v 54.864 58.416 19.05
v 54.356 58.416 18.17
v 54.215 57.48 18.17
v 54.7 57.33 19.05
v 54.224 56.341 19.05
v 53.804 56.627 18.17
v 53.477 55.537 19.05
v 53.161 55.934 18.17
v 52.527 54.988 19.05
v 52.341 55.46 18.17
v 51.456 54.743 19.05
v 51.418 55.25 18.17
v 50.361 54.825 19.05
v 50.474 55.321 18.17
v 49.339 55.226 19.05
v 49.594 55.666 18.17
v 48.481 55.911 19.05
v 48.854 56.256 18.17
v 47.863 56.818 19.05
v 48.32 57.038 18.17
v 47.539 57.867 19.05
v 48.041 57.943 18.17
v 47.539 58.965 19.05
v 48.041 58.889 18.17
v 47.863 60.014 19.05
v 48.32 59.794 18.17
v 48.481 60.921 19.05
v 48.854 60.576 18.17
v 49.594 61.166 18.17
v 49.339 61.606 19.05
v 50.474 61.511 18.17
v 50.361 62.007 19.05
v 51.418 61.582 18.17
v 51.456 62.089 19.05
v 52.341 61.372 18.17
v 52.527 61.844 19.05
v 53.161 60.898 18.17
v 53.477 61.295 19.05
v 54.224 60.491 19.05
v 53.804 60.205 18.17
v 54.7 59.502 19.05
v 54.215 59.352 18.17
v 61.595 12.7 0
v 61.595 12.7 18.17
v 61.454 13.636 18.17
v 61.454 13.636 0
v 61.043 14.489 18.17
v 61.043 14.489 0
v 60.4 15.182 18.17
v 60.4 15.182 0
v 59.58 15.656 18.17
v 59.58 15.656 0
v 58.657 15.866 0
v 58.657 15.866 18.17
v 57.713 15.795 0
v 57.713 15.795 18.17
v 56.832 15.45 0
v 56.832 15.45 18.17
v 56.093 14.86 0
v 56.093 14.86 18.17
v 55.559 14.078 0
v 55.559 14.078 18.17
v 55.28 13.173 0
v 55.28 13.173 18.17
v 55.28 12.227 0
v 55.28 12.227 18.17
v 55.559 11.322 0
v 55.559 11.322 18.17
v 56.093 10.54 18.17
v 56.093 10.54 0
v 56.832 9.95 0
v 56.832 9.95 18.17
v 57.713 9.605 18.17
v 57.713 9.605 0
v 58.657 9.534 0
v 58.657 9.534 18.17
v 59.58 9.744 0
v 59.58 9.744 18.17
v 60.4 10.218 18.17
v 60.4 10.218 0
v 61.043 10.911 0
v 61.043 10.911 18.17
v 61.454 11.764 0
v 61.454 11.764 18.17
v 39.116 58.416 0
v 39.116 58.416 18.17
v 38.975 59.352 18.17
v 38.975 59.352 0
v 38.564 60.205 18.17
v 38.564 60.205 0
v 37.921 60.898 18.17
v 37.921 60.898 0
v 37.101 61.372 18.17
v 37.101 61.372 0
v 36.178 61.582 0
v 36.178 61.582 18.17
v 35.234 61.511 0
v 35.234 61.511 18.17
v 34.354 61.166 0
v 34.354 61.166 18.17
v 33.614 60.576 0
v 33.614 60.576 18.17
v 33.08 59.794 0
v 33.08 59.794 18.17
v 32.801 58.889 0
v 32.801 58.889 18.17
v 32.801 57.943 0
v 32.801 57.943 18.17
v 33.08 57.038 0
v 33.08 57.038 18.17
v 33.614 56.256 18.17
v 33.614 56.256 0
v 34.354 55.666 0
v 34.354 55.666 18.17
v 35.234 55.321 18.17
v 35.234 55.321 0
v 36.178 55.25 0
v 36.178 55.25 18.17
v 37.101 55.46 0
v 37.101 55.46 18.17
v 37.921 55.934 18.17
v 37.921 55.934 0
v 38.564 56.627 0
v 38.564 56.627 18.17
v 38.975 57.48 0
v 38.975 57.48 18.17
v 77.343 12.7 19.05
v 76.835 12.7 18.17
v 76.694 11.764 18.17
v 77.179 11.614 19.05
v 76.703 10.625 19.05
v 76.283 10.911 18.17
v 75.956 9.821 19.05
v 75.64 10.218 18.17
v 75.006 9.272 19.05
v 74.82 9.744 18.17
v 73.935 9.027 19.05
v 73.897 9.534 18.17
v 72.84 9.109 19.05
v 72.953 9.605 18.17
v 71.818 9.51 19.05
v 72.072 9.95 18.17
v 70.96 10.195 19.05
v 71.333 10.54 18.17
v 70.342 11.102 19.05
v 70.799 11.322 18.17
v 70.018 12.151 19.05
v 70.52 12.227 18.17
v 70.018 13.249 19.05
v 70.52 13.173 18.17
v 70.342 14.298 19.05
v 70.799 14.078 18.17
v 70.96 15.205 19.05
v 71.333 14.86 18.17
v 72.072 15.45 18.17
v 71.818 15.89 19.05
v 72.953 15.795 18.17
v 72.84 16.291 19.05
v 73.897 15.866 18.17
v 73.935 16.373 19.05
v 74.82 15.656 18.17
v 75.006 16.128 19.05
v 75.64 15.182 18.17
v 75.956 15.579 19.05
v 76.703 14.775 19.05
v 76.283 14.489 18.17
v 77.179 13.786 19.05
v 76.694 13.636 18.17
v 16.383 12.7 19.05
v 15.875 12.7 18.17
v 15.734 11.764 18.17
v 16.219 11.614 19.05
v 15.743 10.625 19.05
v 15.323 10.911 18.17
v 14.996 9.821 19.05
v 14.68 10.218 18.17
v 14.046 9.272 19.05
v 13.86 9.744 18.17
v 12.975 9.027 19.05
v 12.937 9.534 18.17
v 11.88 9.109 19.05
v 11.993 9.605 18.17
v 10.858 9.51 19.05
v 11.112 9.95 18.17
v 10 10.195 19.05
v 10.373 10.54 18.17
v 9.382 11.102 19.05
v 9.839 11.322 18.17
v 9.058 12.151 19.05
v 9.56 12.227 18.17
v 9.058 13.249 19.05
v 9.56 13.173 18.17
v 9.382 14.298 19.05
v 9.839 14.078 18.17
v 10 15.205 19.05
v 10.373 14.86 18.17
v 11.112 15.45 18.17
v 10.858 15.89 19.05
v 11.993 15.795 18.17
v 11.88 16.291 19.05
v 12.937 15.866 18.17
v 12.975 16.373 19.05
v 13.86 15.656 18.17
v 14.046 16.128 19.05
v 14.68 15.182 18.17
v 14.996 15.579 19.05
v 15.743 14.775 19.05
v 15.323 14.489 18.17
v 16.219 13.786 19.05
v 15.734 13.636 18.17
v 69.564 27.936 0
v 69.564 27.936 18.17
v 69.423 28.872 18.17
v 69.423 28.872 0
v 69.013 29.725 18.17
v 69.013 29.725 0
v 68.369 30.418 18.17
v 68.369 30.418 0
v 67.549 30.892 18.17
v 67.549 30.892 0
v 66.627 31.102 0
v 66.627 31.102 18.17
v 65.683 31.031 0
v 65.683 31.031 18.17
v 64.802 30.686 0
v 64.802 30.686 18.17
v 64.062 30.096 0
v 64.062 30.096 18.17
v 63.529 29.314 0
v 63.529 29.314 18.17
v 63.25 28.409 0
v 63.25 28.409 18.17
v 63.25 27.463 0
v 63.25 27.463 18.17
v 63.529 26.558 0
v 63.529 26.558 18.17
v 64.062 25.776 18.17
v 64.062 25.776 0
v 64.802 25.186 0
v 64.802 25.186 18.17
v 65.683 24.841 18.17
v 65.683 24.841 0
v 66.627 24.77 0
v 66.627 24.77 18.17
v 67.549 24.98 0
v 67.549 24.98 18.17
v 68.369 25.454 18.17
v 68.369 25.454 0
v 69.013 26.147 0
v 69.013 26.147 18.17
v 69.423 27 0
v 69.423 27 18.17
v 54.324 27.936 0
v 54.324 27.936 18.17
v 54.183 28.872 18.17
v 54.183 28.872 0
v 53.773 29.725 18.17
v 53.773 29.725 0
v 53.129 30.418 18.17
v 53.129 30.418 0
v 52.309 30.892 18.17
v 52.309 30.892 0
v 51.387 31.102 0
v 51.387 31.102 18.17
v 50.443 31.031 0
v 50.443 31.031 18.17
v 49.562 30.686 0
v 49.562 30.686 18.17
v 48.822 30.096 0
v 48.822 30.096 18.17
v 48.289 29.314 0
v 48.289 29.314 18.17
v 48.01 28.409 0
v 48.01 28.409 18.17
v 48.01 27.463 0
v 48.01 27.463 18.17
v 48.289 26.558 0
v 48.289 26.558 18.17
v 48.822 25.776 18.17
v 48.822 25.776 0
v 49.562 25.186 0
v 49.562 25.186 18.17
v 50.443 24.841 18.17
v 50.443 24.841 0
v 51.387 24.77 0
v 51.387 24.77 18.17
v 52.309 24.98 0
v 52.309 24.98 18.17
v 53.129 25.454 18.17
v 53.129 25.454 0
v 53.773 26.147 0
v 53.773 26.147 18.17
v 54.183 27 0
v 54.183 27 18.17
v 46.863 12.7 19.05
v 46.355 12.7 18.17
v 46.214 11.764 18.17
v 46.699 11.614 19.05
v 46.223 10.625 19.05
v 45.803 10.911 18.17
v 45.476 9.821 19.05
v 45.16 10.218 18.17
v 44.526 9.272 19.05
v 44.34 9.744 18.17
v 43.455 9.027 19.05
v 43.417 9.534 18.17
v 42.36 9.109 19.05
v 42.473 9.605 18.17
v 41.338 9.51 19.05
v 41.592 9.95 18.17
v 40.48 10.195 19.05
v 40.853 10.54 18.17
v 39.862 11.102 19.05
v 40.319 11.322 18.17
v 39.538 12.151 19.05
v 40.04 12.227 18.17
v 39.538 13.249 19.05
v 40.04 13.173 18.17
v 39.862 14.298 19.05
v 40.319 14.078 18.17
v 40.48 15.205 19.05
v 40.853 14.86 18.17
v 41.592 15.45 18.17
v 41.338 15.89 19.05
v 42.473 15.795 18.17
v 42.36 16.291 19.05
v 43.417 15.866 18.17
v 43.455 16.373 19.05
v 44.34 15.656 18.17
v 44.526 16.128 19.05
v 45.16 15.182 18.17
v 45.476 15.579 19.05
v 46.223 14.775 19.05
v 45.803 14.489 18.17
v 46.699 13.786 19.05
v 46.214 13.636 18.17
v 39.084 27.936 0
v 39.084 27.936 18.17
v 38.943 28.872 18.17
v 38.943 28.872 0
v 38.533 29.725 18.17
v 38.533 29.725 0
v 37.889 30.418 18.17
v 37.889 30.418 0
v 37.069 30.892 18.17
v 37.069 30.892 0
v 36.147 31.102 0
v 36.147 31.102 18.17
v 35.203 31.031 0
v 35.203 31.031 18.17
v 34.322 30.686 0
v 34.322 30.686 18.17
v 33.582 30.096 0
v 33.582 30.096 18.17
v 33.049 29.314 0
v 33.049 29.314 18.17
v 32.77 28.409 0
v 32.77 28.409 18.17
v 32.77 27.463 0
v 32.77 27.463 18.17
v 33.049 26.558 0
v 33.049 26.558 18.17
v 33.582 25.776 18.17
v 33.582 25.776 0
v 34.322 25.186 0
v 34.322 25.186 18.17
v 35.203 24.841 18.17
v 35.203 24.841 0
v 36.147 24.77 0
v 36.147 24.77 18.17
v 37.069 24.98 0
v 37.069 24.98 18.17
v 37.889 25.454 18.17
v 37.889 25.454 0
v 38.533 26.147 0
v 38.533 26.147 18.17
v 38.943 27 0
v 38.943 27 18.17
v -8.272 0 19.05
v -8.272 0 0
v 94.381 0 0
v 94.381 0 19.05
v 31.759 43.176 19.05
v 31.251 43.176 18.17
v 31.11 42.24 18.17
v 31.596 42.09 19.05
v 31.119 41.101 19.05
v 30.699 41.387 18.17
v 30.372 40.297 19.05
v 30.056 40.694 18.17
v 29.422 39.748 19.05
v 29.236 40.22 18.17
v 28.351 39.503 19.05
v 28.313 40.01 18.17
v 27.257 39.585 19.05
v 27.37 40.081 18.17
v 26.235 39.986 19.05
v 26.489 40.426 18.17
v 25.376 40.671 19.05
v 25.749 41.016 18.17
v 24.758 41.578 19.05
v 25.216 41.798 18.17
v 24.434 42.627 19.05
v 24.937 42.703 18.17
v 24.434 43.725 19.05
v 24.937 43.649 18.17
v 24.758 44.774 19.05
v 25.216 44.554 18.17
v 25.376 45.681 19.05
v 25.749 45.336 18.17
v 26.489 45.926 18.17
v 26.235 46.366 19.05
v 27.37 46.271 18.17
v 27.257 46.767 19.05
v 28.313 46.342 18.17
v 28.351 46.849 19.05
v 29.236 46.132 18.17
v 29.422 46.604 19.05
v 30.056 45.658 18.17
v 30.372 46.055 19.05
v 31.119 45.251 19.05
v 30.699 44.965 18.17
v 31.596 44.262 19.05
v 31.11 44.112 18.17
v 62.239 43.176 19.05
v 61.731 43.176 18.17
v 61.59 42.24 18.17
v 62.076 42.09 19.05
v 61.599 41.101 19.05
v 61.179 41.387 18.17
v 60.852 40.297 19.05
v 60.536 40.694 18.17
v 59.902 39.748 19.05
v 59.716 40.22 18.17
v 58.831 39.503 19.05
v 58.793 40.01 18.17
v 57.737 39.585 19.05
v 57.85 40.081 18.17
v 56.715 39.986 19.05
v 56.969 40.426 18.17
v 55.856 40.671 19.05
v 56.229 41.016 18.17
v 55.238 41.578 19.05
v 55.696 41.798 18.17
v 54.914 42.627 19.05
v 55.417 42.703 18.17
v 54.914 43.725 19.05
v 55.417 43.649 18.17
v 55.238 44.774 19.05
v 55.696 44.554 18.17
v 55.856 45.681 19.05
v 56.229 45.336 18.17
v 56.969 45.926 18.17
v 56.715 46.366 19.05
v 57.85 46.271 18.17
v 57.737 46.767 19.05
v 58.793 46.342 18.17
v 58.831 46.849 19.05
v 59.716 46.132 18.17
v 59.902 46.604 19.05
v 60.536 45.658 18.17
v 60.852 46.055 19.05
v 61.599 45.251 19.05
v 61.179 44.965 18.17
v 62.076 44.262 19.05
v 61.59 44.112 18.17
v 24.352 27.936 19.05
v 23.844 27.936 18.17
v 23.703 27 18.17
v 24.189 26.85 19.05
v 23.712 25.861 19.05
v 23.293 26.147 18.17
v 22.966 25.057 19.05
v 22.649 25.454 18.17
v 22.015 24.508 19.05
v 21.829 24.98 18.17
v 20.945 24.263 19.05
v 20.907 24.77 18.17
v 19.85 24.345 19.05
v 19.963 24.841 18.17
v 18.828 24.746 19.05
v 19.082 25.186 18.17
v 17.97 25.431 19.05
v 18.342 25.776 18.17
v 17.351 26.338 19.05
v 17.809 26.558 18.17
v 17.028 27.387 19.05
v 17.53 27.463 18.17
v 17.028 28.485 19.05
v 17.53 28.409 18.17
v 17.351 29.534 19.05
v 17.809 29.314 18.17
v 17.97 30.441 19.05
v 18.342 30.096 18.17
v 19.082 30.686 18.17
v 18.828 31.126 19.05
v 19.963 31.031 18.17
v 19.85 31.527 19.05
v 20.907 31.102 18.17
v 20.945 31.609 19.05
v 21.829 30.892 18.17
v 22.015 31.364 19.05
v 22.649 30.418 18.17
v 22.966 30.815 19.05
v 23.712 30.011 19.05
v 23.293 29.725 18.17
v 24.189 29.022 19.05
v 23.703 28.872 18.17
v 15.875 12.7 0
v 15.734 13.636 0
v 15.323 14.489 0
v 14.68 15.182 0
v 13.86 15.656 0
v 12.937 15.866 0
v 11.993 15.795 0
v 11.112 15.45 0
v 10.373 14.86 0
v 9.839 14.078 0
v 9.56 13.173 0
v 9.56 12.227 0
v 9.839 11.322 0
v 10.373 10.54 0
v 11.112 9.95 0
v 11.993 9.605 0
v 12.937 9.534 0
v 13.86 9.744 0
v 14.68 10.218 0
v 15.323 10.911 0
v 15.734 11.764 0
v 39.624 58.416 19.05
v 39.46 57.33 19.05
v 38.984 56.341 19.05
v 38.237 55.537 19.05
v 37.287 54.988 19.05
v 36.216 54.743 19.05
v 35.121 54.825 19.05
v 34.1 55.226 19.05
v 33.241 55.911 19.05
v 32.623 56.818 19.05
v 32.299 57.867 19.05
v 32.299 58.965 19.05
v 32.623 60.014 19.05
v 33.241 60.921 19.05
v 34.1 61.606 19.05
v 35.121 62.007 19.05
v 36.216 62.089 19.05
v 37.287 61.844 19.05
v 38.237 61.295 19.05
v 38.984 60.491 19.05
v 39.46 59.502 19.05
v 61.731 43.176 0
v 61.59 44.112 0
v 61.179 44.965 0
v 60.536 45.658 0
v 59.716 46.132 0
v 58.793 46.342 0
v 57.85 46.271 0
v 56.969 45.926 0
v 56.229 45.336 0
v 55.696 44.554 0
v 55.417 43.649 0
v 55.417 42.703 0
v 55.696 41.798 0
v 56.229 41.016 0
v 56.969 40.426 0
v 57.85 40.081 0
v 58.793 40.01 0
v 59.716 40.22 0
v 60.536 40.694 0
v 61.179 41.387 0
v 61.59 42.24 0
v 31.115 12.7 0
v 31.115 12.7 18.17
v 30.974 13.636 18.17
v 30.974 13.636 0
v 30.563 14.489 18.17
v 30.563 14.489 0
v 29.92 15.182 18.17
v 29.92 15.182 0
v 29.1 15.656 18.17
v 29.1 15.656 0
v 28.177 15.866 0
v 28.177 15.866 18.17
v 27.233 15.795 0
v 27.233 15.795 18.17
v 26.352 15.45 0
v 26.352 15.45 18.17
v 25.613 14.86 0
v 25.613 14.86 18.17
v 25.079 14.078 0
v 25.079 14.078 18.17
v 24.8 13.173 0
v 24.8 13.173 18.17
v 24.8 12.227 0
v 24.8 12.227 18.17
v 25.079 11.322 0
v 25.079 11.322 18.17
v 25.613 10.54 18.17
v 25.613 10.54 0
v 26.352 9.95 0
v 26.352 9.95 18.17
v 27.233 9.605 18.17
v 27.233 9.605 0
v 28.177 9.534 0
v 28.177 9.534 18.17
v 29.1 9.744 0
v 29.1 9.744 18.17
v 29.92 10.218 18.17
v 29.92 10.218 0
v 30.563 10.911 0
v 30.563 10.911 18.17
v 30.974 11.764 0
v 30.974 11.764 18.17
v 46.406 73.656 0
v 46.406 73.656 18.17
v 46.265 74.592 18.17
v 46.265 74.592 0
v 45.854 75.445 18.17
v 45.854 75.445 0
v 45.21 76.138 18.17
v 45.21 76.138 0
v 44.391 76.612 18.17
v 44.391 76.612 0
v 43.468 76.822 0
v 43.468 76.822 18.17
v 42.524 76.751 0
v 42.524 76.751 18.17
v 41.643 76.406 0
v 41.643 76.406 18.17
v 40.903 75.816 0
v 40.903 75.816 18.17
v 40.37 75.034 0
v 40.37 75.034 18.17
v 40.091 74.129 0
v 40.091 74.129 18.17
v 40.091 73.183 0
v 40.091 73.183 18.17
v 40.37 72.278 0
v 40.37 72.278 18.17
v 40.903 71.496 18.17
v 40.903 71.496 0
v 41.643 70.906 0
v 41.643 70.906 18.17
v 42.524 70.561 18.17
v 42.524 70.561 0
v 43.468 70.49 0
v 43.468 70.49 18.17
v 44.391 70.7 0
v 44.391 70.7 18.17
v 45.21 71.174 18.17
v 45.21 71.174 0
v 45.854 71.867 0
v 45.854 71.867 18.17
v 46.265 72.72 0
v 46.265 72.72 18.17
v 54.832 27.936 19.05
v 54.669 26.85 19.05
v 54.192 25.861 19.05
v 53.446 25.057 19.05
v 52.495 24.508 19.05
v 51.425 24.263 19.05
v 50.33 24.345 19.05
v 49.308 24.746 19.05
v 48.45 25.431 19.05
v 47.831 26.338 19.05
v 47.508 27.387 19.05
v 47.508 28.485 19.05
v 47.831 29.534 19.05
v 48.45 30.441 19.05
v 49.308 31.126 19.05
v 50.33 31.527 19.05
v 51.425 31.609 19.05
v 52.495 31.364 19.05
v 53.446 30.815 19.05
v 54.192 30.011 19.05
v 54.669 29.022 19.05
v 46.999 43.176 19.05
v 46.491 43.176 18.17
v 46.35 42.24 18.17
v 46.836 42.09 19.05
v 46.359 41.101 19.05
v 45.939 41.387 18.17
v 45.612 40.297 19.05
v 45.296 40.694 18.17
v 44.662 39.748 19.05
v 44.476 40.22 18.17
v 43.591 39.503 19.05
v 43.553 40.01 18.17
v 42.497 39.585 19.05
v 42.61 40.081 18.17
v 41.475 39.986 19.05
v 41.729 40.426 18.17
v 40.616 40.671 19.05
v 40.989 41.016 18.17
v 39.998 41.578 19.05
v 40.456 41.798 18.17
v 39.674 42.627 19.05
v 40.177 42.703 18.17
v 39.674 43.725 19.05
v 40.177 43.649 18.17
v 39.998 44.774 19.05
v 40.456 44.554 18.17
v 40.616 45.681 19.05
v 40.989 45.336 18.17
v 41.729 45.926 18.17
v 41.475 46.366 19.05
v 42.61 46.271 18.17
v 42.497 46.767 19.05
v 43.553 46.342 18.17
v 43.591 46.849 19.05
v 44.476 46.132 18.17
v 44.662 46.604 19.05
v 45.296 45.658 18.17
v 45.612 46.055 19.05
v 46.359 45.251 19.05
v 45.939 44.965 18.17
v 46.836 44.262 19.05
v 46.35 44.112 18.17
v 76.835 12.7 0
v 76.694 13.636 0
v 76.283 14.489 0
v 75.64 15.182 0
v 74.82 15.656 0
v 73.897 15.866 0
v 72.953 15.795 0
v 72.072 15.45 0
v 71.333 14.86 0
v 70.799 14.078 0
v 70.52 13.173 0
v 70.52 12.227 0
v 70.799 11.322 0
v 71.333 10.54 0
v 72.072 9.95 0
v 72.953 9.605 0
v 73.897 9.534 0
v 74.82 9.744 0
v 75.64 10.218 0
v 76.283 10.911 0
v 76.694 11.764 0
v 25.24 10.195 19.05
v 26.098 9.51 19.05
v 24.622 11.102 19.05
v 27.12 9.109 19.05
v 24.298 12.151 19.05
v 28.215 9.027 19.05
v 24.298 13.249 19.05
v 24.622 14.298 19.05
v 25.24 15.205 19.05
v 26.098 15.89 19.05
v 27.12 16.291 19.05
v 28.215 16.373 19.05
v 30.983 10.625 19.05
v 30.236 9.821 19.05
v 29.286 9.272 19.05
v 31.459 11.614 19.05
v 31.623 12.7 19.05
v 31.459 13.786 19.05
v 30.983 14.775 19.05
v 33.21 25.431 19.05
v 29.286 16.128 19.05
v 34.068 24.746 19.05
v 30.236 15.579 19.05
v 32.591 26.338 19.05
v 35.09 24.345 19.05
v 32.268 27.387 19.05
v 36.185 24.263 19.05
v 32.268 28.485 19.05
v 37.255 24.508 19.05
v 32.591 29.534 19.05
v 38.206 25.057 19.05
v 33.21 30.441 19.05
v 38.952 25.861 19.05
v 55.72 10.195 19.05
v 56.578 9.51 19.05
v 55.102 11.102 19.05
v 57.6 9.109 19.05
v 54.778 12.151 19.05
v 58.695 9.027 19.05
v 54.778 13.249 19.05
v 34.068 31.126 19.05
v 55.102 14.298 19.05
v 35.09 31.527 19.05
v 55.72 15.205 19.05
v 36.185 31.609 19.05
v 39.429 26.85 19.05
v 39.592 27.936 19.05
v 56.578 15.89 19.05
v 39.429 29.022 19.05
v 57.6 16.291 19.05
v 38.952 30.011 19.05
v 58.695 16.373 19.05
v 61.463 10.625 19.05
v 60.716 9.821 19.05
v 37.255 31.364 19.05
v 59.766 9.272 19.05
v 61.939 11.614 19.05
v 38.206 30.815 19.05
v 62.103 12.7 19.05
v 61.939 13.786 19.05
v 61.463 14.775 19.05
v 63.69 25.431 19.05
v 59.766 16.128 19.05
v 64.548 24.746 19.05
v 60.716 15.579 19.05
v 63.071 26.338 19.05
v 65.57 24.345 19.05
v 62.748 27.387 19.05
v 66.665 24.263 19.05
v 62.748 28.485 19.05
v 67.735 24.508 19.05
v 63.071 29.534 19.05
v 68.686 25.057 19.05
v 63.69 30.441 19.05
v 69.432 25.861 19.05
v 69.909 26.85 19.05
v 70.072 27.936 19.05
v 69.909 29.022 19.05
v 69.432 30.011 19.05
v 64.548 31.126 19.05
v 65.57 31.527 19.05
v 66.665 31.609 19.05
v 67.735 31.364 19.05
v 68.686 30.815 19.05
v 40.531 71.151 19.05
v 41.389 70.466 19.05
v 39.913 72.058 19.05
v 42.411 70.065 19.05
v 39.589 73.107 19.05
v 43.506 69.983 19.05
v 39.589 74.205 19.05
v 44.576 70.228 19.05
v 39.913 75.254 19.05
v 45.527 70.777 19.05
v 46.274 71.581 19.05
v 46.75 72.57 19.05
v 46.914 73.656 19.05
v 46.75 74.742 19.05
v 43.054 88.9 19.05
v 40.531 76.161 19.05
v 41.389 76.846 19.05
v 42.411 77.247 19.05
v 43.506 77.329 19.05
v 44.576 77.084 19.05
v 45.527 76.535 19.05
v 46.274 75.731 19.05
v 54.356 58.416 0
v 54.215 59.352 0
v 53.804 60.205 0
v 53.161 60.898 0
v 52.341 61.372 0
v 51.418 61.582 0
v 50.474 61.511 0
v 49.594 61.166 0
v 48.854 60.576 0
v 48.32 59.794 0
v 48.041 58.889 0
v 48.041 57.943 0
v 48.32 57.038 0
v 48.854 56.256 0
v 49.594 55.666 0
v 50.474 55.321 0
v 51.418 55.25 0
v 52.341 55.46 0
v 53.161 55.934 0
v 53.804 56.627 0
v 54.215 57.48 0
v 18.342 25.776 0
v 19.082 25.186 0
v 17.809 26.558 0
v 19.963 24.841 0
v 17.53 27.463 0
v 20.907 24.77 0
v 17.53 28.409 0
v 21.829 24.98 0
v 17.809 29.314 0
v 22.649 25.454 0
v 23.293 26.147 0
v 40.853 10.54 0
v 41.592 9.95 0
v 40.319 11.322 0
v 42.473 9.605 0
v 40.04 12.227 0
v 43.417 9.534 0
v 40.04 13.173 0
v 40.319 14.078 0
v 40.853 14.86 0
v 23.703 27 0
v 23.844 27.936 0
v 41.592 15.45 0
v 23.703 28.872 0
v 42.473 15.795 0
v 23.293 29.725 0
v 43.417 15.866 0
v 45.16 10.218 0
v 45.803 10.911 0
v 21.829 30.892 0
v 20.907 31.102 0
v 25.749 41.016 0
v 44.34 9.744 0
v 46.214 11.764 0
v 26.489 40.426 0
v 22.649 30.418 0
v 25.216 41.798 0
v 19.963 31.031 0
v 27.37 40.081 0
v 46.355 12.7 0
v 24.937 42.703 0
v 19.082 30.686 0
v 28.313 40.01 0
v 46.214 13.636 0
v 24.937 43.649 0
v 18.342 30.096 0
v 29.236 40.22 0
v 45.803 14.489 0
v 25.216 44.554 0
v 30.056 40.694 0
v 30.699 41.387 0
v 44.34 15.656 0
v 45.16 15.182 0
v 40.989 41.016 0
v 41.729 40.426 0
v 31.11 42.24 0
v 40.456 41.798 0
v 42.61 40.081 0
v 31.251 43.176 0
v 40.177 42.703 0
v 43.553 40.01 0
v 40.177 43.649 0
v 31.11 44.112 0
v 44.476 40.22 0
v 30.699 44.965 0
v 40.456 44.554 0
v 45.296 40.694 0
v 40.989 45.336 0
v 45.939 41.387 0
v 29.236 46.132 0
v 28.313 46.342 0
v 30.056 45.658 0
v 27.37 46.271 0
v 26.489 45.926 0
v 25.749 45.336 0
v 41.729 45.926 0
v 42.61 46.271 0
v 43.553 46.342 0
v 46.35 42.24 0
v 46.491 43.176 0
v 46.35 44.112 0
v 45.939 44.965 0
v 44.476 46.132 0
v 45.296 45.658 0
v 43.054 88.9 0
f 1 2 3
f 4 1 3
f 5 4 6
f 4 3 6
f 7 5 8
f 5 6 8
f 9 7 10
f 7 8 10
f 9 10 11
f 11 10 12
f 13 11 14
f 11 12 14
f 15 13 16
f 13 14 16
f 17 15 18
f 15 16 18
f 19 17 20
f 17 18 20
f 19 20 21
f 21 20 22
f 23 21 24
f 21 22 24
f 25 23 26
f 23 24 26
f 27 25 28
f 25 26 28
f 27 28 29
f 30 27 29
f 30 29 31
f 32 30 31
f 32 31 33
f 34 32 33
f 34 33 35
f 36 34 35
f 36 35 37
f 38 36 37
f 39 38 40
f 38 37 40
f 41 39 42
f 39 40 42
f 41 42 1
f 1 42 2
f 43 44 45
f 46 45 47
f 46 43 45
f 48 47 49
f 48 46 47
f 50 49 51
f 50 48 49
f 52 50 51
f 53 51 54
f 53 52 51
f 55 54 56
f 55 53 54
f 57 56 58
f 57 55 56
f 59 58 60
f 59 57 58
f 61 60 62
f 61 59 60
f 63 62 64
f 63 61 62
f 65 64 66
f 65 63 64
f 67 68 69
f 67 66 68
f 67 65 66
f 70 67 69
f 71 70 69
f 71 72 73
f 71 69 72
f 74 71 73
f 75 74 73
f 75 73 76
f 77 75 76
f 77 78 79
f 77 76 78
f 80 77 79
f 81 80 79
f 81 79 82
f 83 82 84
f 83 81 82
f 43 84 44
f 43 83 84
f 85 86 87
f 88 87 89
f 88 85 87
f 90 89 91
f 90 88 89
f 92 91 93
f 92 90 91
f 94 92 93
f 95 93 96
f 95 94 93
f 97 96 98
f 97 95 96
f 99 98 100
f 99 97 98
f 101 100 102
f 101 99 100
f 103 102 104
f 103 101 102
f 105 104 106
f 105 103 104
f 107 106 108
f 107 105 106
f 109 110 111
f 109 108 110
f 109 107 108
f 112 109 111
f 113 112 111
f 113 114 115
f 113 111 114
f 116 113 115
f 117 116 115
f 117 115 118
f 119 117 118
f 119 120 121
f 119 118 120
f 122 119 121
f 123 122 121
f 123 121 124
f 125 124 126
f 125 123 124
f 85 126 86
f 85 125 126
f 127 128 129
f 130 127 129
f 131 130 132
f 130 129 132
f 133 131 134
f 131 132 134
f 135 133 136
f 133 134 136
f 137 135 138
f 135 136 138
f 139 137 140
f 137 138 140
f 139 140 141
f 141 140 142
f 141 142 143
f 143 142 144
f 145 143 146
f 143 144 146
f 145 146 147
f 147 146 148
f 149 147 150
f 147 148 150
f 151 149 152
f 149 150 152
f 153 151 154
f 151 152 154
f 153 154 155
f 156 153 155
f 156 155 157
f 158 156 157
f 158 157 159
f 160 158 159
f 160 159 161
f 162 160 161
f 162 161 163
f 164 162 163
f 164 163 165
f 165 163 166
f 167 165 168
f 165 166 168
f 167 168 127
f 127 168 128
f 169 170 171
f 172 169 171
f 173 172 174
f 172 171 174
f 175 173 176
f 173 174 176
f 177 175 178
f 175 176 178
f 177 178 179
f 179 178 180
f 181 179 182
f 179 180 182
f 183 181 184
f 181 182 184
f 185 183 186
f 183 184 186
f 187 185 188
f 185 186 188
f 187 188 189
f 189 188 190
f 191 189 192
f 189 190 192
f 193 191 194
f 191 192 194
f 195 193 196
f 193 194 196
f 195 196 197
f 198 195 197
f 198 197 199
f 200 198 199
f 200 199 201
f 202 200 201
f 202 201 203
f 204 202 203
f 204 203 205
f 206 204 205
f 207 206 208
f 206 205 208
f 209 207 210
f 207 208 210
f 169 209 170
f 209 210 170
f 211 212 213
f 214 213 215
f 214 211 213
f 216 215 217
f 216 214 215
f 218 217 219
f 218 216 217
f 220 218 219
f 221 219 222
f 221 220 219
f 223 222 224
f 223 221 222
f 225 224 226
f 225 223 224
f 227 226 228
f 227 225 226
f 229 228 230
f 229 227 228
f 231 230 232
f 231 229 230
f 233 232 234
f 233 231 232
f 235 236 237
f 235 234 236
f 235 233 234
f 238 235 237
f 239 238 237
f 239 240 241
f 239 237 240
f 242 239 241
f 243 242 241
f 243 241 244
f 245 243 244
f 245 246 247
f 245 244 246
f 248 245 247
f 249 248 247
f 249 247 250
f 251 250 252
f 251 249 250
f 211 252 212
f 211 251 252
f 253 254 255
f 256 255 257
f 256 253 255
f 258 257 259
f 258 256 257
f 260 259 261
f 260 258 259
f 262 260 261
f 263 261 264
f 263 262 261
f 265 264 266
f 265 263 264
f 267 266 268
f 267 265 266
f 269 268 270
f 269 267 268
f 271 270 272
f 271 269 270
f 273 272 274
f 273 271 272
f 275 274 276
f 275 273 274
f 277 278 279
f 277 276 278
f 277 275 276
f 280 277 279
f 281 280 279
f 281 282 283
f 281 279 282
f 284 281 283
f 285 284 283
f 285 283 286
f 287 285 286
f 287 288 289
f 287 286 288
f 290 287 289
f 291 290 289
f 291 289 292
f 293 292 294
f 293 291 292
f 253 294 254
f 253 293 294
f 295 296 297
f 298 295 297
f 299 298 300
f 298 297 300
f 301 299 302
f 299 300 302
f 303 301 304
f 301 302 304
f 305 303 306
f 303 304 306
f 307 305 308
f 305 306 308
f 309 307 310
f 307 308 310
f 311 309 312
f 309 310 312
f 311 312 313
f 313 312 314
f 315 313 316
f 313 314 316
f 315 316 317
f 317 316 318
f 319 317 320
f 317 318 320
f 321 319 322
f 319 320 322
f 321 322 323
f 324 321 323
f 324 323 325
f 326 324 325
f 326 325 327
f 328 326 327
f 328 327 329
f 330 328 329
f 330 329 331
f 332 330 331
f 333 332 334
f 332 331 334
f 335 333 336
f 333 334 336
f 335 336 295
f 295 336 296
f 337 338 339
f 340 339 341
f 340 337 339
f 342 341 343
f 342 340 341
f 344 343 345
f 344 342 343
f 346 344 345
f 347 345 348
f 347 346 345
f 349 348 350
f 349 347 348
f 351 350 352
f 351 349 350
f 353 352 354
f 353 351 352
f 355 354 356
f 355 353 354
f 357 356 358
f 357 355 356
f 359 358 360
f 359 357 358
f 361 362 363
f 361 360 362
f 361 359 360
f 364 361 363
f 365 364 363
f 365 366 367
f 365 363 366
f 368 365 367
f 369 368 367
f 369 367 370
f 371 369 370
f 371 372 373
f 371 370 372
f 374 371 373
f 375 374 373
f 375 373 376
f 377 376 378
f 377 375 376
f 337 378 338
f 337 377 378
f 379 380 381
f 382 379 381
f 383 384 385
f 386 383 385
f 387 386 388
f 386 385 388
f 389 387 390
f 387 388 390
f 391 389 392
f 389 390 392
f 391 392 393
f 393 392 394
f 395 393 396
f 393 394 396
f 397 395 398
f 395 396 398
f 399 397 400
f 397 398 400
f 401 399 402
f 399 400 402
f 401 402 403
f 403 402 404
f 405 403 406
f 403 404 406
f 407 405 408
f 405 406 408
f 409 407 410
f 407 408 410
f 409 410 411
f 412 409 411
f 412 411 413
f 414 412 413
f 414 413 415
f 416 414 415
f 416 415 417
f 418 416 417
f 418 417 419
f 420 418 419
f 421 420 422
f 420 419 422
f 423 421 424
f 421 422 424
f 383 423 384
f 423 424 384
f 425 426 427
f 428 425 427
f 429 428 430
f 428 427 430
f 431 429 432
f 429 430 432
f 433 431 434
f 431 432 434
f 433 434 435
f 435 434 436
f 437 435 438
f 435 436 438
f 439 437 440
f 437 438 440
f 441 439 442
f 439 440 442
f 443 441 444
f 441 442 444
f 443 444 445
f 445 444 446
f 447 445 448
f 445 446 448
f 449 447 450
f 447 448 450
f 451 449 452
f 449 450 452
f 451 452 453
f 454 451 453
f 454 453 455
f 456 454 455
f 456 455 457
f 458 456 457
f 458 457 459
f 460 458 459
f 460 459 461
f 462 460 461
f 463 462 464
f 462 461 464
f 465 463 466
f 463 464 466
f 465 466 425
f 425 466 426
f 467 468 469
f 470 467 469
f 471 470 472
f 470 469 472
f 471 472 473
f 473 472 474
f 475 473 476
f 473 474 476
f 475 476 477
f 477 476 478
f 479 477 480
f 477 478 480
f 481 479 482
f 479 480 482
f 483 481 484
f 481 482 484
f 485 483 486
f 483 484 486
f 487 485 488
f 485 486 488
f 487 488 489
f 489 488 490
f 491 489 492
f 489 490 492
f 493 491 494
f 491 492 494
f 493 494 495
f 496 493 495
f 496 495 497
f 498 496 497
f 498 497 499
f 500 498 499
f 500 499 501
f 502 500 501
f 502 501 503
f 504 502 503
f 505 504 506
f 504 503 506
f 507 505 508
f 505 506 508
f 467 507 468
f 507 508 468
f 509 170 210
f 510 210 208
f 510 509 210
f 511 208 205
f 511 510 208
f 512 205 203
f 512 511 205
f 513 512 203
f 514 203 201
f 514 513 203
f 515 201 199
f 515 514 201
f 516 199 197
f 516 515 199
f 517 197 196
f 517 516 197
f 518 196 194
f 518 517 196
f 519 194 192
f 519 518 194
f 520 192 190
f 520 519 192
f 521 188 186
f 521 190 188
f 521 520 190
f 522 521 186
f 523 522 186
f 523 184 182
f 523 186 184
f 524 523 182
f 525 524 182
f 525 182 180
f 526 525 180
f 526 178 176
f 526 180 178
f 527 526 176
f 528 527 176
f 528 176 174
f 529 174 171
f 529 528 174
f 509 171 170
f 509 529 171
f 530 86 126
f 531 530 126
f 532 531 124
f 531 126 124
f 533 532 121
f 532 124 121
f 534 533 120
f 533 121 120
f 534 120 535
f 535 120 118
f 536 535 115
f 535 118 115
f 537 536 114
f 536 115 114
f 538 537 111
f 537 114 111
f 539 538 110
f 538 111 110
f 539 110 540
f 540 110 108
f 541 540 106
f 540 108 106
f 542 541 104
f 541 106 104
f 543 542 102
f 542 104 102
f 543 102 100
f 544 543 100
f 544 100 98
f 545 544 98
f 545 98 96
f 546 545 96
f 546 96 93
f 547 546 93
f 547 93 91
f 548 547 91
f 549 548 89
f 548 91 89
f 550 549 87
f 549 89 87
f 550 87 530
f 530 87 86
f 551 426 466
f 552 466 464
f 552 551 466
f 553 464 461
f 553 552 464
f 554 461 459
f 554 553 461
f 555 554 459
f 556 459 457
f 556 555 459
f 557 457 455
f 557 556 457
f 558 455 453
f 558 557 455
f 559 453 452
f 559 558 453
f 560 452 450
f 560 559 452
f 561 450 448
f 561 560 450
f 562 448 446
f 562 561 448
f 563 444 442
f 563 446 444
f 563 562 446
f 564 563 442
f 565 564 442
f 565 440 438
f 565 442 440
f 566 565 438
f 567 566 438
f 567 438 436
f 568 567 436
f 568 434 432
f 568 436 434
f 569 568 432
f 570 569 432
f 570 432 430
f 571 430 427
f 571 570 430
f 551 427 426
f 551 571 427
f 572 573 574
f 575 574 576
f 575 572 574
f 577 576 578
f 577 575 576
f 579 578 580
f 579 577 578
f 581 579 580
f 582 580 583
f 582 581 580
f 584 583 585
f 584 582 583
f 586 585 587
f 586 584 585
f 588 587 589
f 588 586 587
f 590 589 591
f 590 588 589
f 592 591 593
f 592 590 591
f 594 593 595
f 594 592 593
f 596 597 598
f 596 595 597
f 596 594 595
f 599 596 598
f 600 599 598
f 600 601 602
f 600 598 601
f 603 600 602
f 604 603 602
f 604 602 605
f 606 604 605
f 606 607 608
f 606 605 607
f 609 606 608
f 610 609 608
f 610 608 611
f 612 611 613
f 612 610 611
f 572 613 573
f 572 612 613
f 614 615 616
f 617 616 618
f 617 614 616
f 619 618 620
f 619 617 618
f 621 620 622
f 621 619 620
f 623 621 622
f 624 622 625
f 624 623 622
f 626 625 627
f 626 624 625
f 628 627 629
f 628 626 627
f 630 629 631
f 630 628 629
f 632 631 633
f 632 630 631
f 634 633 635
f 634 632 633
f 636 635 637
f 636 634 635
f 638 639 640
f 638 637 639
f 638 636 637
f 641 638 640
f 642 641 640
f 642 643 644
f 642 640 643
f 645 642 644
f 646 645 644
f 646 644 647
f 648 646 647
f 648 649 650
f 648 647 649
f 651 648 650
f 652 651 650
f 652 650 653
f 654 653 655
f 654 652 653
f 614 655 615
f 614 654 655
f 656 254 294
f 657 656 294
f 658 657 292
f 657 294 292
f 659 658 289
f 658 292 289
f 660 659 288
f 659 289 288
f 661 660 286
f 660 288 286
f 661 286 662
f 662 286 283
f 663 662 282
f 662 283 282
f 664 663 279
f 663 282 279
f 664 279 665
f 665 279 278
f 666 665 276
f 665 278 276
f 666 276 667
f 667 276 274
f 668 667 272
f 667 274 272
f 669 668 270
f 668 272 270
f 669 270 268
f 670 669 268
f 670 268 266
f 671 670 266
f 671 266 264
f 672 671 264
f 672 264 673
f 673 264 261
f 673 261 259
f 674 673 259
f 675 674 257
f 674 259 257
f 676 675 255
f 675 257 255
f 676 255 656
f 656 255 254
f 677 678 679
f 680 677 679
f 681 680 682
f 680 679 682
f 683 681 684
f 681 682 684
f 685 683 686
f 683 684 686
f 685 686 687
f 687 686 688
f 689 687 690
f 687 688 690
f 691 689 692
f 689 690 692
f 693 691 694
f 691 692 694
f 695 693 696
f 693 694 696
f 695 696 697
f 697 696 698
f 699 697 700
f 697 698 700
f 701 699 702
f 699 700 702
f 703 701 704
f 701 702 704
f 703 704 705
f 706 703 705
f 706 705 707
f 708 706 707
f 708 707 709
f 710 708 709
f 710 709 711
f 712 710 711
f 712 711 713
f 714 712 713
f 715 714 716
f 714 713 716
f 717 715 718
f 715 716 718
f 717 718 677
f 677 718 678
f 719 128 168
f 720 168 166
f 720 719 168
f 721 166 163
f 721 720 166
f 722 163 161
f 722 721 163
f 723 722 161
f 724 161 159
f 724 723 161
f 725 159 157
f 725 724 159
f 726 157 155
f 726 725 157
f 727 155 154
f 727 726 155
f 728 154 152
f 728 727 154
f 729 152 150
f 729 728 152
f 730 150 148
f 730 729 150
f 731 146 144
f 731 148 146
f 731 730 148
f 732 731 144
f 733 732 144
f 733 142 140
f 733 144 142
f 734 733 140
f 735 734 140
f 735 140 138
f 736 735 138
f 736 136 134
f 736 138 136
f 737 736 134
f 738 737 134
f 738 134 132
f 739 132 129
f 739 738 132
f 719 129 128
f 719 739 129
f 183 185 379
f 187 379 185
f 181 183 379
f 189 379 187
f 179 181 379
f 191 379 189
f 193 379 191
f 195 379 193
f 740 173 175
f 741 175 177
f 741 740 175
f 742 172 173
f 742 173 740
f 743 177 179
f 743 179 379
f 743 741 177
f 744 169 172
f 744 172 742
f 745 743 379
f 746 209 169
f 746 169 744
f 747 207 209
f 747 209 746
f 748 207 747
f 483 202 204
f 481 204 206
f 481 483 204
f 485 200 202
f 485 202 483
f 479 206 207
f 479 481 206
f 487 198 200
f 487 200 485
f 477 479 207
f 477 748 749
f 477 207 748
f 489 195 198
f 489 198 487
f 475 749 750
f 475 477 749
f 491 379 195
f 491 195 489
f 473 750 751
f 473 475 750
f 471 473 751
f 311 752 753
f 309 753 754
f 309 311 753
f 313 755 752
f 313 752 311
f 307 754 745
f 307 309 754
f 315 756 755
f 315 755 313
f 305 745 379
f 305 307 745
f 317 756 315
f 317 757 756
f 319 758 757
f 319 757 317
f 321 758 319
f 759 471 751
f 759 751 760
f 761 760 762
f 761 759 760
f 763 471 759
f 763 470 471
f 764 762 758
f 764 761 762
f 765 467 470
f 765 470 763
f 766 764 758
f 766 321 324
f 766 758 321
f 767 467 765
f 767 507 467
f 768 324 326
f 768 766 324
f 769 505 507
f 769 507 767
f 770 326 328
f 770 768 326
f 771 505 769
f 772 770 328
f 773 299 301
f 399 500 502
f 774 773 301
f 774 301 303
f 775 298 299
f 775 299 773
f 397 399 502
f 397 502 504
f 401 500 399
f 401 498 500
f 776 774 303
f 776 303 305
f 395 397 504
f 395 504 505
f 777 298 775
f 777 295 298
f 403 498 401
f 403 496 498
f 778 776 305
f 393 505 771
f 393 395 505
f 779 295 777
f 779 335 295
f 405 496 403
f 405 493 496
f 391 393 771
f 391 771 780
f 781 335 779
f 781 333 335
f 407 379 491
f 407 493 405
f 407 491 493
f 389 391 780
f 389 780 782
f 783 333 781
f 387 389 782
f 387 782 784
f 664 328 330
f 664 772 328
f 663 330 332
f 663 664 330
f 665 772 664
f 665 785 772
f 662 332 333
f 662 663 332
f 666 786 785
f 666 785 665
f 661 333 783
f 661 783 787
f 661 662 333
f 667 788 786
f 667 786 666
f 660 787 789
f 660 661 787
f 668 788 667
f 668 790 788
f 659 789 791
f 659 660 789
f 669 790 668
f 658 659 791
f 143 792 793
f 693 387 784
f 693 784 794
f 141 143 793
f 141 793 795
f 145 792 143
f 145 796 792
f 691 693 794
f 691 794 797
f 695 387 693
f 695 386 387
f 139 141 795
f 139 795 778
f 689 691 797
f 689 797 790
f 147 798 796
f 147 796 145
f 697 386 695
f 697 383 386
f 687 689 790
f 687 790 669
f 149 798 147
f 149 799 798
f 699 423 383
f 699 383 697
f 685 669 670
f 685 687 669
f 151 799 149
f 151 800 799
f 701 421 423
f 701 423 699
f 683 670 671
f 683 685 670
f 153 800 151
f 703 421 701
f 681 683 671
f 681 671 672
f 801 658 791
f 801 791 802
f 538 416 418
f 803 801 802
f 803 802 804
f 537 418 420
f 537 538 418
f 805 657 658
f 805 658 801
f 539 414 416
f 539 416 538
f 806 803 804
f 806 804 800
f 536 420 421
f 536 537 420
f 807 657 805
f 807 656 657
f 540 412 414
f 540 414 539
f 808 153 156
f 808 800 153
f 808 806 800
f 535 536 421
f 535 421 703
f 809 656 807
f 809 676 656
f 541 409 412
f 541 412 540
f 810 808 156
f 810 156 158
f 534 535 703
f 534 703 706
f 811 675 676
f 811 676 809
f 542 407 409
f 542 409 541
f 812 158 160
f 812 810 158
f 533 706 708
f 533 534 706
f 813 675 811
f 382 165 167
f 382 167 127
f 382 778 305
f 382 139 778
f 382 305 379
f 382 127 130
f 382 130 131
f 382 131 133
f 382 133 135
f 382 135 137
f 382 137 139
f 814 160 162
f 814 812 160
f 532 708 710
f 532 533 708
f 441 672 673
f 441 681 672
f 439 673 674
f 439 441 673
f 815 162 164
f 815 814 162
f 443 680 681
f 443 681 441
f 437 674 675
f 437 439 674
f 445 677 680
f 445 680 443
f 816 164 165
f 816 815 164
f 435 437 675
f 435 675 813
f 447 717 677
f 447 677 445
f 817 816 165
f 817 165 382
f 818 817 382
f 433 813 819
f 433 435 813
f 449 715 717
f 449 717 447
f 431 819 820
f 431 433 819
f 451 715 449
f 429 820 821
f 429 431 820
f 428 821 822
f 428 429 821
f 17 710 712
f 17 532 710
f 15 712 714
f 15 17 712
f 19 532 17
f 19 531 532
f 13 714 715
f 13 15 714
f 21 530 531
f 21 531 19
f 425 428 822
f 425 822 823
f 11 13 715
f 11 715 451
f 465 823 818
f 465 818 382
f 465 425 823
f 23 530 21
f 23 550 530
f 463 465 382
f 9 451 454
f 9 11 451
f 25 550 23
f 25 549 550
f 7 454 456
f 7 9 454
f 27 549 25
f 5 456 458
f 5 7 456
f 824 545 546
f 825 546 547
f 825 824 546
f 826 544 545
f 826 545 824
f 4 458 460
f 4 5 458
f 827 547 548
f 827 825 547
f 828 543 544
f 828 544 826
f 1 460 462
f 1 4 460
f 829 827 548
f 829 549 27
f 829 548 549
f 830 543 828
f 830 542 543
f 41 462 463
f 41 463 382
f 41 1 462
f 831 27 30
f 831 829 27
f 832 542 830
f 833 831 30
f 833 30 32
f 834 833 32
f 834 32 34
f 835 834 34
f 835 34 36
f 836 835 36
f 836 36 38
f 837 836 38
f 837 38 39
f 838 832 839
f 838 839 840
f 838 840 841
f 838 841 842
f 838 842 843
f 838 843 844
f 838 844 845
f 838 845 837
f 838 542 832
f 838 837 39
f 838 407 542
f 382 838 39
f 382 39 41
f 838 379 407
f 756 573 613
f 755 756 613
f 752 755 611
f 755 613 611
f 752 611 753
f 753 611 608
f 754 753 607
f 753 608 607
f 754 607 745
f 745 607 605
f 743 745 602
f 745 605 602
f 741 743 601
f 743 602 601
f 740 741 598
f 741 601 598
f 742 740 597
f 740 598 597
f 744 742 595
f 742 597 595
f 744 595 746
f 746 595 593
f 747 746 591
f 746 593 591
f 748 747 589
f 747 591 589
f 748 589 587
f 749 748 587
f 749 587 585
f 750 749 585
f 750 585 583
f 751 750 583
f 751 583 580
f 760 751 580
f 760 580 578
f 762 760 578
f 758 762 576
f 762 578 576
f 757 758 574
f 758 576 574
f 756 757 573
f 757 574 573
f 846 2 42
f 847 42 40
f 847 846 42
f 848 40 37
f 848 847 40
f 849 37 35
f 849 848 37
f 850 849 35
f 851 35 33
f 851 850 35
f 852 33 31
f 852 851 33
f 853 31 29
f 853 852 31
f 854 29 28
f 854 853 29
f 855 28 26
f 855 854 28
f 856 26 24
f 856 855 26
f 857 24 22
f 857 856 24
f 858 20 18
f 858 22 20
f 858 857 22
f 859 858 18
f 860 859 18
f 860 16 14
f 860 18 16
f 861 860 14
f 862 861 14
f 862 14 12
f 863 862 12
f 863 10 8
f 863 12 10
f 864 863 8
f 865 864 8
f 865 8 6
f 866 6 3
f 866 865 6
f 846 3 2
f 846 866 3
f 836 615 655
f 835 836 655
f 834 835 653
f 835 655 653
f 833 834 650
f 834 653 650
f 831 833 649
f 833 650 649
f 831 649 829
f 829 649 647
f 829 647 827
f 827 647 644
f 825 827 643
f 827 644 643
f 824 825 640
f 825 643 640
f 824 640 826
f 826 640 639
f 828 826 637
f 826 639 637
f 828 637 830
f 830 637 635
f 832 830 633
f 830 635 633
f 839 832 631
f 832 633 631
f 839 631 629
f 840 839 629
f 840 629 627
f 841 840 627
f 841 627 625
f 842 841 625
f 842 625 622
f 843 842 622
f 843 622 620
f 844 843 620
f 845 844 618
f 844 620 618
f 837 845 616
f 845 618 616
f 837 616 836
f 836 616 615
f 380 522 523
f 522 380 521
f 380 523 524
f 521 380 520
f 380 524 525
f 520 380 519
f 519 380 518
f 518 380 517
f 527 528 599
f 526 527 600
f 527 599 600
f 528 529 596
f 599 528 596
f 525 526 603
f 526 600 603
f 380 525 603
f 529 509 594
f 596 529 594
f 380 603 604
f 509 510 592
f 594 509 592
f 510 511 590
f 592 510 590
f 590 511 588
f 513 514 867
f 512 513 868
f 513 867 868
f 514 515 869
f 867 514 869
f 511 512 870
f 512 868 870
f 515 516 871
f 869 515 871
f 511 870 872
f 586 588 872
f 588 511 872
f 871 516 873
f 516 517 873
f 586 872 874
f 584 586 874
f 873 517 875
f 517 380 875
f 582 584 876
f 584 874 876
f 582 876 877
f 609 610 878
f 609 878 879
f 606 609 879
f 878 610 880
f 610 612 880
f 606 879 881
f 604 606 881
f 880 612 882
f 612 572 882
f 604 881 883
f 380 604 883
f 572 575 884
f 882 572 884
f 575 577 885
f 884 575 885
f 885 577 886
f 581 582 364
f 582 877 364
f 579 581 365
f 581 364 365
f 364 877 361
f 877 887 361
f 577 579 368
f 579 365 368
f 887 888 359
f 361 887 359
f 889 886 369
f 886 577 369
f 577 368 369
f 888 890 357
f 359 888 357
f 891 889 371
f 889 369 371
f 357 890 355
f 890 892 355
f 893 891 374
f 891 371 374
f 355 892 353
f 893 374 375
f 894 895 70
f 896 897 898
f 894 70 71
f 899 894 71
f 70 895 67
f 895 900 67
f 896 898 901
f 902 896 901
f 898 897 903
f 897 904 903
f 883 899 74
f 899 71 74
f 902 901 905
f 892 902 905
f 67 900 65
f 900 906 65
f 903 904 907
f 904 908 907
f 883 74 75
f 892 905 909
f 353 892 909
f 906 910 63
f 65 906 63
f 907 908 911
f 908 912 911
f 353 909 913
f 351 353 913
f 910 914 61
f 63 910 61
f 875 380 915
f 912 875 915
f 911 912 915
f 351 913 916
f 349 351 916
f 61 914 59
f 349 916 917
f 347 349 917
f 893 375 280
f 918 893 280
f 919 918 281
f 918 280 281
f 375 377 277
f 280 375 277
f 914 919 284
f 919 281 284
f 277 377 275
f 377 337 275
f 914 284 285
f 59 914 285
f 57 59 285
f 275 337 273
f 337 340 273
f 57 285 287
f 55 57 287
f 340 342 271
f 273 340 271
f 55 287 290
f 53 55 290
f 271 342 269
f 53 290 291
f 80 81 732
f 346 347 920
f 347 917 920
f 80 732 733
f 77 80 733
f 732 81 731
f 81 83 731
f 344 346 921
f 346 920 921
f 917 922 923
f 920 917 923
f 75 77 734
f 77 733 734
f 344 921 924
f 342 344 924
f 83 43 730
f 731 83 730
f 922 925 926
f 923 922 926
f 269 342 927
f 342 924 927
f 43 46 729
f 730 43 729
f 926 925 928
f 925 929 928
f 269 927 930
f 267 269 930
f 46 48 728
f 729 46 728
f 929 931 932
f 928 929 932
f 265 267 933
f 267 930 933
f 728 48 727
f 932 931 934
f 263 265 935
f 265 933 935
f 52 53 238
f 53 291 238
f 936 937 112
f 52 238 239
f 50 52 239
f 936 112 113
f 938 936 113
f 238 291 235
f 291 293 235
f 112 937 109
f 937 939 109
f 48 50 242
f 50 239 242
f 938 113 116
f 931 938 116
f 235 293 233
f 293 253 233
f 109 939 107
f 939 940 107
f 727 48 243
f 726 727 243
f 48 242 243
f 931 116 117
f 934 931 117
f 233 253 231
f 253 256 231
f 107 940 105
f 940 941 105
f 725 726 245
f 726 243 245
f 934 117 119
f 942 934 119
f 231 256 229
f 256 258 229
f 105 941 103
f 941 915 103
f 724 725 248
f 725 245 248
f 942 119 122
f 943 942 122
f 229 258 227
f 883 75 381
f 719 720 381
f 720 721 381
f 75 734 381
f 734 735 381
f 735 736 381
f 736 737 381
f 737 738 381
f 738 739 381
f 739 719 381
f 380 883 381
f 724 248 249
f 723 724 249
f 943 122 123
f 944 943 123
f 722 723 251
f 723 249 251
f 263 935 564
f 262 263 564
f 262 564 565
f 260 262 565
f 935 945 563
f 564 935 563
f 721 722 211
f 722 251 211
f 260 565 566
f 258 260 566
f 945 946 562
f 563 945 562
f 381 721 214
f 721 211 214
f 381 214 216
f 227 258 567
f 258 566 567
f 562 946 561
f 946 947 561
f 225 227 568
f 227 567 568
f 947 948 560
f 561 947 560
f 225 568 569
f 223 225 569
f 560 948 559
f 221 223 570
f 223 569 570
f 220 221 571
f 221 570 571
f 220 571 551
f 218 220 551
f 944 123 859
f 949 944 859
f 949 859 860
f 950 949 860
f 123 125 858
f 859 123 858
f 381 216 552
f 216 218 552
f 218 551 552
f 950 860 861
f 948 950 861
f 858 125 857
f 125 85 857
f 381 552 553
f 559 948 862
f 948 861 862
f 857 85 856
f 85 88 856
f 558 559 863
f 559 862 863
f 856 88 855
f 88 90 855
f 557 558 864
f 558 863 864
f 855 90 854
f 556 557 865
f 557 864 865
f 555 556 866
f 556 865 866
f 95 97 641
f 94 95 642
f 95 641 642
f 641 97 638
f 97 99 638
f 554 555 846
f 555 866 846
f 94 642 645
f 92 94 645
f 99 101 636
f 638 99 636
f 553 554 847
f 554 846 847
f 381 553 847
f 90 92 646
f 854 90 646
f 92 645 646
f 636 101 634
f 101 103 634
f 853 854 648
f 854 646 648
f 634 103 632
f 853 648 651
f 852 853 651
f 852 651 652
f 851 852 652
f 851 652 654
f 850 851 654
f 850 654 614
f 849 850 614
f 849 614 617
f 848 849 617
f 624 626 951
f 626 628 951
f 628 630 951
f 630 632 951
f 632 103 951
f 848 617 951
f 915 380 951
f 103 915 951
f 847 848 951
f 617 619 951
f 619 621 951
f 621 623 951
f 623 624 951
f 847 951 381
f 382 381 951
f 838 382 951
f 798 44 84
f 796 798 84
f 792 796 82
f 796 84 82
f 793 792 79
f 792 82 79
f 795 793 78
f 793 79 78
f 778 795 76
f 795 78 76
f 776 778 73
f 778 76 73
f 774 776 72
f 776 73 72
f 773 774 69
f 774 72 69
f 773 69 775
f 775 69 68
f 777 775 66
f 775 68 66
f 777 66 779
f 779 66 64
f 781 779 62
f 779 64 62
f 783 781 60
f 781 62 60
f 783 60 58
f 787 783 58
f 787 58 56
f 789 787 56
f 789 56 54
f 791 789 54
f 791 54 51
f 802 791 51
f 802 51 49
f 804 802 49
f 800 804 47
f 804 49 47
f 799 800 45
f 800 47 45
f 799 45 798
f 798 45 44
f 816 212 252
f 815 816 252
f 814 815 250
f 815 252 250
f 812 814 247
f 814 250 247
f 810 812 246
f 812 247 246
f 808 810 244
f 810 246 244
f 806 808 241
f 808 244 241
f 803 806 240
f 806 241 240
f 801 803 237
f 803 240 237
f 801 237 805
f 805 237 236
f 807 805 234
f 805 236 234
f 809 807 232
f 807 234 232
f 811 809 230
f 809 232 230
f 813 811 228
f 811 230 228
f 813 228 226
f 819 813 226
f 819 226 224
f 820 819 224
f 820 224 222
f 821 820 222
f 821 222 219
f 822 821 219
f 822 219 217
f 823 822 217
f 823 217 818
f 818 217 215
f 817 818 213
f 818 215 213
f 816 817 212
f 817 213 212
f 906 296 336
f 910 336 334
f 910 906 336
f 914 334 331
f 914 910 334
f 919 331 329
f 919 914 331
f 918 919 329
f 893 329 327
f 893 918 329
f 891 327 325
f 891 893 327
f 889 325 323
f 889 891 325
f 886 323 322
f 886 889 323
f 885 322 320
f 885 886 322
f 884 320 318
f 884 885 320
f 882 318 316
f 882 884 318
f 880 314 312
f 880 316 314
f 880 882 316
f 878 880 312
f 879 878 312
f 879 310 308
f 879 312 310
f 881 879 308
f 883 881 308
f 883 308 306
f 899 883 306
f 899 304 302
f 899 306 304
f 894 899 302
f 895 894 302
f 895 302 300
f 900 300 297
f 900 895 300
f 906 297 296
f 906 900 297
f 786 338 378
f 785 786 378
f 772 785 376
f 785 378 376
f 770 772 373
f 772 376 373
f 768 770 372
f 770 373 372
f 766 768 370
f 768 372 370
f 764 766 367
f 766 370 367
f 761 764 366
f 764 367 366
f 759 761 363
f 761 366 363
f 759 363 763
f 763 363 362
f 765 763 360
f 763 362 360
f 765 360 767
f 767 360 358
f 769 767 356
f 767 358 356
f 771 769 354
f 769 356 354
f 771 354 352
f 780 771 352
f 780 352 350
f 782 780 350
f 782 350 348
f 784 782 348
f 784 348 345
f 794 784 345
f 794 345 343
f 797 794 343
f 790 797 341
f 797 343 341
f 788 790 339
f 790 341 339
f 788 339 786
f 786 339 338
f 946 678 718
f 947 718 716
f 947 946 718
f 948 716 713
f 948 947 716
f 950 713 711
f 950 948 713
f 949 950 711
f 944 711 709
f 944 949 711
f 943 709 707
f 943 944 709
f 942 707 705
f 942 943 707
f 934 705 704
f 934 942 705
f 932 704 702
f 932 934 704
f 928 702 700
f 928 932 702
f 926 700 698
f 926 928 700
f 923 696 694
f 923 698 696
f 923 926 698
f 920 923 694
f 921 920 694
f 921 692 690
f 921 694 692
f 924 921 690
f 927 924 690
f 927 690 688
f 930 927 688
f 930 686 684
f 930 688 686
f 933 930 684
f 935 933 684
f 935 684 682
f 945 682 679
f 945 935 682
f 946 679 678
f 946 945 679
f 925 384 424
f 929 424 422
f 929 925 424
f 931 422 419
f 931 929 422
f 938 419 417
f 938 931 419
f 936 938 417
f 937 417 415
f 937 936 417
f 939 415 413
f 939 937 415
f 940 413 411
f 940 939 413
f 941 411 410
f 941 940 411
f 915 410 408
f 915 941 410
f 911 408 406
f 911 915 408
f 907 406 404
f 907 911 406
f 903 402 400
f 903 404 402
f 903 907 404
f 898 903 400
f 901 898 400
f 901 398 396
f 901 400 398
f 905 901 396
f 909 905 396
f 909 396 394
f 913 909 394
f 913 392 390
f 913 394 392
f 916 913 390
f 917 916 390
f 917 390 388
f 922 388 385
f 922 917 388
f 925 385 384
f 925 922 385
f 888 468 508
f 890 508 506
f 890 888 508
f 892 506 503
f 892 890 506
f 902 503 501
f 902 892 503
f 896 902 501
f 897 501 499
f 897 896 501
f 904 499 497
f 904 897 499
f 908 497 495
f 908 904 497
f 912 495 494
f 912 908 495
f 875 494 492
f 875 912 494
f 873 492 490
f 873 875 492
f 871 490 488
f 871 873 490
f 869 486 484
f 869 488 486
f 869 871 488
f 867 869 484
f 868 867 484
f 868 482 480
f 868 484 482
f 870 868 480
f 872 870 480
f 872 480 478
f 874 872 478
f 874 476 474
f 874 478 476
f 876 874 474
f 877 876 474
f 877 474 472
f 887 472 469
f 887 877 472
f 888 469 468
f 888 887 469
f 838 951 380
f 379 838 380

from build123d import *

# Parameters (mm, degrees)
F7_DEPTH = 19.05
F1_R     = 3.175
F2_R     = 3.175
F3_R     = 3.175
F4_R     = 3.175
F5_R     = 3.175
F8_DEPTH = 25.4
F9_SIZE2 = 0.879882
F9_SIZE  = 0.508


with BuildPart() as f7:
    # F6 (on face) → F7 (new body)
    with BuildSketch(Plane.XY):
        Polygon((-8.272192, 0), (94.380685, 0), (43.054246, 88.9), align=None)
    extrude(amount=F7_DEPTH)

    # F1 (on face) + F2 (on face) + F3 (on face) + F4 (on face) + F5 (on face) → F8 (cut)
    with BuildSketch(Plane.XY):
        with Locations((12.7, 12.7)):
            Circle(F1_R)
        with Locations((27.94, 12.7)):
            Circle(F1_R)
        with Locations((43.18, 12.7)):
            Circle(F1_R)
        with Locations((58.42, 12.7)):
            Circle(F1_R)
        with Locations((73.66, 12.7)):
            Circle(F1_R)
    with BuildSketch(Plane.XY):
        with Locations((20.669391, 27.935994)):
            Circle(F2_R)
        with Locations((35.909391, 27.935994)):
            Circle(F2_R)
        with Locations((51.149391, 27.935994)):
            Circle(F2_R)
        with Locations((66.389391, 27.935994)):
            Circle(F2_R)
    with BuildSketch(Plane.XY):
        with Locations((28.076159, 43.175994)):
            Circle(F3_R)
        with Locations((43.316159, 43.175994)):
            Circle(F3_R)
        with Locations((58.556159, 43.175994)):
            Circle(F3_R)
    with BuildSketch(Plane.XY):
        with Locations((35.941, 58.415994)):
            Circle(F4_R)
        with Locations((51.181, 58.415994)):
            Circle(F4_R)
    with BuildSketch(Plane.XY):
        with Locations((43.2308, 73.655994)):
            Circle(F5_R)
    extrude(amount=F8_DEPTH, mode=Mode.SUBTRACT)

    # F9
    f9_edges = [f7.edges().sort_by_distance(p)[0] for p in [
        (9.525, 12.7, 19.05),
        (24.765, 12.7, 19.05),
        (40.005, 12.7, 19.05),
        (55.245, 12.7, 19.05),
        (70.485, 12.7, 19.05),
        (63.214391, 27.935994, 19.05),
        (47.974391, 27.935994, 19.05),
        (32.734391, 27.935994, 19.05),
        (17.494391, 27.935994, 19.05),
        (24.901159, 43.175994, 19.05),
        (40.141159, 43.175994, 19.05),
        (55.381159, 43.175994, 19.05),
        (48.006, 58.415994, 19.05),
        (32.766, 58.415994, 19.05),
        (40.0558, 73.655994, 19.05),
    ]]
    chamfer(f9_edges, length=F9_SIZE, length2=F9_SIZE2)


solid = f7.part
